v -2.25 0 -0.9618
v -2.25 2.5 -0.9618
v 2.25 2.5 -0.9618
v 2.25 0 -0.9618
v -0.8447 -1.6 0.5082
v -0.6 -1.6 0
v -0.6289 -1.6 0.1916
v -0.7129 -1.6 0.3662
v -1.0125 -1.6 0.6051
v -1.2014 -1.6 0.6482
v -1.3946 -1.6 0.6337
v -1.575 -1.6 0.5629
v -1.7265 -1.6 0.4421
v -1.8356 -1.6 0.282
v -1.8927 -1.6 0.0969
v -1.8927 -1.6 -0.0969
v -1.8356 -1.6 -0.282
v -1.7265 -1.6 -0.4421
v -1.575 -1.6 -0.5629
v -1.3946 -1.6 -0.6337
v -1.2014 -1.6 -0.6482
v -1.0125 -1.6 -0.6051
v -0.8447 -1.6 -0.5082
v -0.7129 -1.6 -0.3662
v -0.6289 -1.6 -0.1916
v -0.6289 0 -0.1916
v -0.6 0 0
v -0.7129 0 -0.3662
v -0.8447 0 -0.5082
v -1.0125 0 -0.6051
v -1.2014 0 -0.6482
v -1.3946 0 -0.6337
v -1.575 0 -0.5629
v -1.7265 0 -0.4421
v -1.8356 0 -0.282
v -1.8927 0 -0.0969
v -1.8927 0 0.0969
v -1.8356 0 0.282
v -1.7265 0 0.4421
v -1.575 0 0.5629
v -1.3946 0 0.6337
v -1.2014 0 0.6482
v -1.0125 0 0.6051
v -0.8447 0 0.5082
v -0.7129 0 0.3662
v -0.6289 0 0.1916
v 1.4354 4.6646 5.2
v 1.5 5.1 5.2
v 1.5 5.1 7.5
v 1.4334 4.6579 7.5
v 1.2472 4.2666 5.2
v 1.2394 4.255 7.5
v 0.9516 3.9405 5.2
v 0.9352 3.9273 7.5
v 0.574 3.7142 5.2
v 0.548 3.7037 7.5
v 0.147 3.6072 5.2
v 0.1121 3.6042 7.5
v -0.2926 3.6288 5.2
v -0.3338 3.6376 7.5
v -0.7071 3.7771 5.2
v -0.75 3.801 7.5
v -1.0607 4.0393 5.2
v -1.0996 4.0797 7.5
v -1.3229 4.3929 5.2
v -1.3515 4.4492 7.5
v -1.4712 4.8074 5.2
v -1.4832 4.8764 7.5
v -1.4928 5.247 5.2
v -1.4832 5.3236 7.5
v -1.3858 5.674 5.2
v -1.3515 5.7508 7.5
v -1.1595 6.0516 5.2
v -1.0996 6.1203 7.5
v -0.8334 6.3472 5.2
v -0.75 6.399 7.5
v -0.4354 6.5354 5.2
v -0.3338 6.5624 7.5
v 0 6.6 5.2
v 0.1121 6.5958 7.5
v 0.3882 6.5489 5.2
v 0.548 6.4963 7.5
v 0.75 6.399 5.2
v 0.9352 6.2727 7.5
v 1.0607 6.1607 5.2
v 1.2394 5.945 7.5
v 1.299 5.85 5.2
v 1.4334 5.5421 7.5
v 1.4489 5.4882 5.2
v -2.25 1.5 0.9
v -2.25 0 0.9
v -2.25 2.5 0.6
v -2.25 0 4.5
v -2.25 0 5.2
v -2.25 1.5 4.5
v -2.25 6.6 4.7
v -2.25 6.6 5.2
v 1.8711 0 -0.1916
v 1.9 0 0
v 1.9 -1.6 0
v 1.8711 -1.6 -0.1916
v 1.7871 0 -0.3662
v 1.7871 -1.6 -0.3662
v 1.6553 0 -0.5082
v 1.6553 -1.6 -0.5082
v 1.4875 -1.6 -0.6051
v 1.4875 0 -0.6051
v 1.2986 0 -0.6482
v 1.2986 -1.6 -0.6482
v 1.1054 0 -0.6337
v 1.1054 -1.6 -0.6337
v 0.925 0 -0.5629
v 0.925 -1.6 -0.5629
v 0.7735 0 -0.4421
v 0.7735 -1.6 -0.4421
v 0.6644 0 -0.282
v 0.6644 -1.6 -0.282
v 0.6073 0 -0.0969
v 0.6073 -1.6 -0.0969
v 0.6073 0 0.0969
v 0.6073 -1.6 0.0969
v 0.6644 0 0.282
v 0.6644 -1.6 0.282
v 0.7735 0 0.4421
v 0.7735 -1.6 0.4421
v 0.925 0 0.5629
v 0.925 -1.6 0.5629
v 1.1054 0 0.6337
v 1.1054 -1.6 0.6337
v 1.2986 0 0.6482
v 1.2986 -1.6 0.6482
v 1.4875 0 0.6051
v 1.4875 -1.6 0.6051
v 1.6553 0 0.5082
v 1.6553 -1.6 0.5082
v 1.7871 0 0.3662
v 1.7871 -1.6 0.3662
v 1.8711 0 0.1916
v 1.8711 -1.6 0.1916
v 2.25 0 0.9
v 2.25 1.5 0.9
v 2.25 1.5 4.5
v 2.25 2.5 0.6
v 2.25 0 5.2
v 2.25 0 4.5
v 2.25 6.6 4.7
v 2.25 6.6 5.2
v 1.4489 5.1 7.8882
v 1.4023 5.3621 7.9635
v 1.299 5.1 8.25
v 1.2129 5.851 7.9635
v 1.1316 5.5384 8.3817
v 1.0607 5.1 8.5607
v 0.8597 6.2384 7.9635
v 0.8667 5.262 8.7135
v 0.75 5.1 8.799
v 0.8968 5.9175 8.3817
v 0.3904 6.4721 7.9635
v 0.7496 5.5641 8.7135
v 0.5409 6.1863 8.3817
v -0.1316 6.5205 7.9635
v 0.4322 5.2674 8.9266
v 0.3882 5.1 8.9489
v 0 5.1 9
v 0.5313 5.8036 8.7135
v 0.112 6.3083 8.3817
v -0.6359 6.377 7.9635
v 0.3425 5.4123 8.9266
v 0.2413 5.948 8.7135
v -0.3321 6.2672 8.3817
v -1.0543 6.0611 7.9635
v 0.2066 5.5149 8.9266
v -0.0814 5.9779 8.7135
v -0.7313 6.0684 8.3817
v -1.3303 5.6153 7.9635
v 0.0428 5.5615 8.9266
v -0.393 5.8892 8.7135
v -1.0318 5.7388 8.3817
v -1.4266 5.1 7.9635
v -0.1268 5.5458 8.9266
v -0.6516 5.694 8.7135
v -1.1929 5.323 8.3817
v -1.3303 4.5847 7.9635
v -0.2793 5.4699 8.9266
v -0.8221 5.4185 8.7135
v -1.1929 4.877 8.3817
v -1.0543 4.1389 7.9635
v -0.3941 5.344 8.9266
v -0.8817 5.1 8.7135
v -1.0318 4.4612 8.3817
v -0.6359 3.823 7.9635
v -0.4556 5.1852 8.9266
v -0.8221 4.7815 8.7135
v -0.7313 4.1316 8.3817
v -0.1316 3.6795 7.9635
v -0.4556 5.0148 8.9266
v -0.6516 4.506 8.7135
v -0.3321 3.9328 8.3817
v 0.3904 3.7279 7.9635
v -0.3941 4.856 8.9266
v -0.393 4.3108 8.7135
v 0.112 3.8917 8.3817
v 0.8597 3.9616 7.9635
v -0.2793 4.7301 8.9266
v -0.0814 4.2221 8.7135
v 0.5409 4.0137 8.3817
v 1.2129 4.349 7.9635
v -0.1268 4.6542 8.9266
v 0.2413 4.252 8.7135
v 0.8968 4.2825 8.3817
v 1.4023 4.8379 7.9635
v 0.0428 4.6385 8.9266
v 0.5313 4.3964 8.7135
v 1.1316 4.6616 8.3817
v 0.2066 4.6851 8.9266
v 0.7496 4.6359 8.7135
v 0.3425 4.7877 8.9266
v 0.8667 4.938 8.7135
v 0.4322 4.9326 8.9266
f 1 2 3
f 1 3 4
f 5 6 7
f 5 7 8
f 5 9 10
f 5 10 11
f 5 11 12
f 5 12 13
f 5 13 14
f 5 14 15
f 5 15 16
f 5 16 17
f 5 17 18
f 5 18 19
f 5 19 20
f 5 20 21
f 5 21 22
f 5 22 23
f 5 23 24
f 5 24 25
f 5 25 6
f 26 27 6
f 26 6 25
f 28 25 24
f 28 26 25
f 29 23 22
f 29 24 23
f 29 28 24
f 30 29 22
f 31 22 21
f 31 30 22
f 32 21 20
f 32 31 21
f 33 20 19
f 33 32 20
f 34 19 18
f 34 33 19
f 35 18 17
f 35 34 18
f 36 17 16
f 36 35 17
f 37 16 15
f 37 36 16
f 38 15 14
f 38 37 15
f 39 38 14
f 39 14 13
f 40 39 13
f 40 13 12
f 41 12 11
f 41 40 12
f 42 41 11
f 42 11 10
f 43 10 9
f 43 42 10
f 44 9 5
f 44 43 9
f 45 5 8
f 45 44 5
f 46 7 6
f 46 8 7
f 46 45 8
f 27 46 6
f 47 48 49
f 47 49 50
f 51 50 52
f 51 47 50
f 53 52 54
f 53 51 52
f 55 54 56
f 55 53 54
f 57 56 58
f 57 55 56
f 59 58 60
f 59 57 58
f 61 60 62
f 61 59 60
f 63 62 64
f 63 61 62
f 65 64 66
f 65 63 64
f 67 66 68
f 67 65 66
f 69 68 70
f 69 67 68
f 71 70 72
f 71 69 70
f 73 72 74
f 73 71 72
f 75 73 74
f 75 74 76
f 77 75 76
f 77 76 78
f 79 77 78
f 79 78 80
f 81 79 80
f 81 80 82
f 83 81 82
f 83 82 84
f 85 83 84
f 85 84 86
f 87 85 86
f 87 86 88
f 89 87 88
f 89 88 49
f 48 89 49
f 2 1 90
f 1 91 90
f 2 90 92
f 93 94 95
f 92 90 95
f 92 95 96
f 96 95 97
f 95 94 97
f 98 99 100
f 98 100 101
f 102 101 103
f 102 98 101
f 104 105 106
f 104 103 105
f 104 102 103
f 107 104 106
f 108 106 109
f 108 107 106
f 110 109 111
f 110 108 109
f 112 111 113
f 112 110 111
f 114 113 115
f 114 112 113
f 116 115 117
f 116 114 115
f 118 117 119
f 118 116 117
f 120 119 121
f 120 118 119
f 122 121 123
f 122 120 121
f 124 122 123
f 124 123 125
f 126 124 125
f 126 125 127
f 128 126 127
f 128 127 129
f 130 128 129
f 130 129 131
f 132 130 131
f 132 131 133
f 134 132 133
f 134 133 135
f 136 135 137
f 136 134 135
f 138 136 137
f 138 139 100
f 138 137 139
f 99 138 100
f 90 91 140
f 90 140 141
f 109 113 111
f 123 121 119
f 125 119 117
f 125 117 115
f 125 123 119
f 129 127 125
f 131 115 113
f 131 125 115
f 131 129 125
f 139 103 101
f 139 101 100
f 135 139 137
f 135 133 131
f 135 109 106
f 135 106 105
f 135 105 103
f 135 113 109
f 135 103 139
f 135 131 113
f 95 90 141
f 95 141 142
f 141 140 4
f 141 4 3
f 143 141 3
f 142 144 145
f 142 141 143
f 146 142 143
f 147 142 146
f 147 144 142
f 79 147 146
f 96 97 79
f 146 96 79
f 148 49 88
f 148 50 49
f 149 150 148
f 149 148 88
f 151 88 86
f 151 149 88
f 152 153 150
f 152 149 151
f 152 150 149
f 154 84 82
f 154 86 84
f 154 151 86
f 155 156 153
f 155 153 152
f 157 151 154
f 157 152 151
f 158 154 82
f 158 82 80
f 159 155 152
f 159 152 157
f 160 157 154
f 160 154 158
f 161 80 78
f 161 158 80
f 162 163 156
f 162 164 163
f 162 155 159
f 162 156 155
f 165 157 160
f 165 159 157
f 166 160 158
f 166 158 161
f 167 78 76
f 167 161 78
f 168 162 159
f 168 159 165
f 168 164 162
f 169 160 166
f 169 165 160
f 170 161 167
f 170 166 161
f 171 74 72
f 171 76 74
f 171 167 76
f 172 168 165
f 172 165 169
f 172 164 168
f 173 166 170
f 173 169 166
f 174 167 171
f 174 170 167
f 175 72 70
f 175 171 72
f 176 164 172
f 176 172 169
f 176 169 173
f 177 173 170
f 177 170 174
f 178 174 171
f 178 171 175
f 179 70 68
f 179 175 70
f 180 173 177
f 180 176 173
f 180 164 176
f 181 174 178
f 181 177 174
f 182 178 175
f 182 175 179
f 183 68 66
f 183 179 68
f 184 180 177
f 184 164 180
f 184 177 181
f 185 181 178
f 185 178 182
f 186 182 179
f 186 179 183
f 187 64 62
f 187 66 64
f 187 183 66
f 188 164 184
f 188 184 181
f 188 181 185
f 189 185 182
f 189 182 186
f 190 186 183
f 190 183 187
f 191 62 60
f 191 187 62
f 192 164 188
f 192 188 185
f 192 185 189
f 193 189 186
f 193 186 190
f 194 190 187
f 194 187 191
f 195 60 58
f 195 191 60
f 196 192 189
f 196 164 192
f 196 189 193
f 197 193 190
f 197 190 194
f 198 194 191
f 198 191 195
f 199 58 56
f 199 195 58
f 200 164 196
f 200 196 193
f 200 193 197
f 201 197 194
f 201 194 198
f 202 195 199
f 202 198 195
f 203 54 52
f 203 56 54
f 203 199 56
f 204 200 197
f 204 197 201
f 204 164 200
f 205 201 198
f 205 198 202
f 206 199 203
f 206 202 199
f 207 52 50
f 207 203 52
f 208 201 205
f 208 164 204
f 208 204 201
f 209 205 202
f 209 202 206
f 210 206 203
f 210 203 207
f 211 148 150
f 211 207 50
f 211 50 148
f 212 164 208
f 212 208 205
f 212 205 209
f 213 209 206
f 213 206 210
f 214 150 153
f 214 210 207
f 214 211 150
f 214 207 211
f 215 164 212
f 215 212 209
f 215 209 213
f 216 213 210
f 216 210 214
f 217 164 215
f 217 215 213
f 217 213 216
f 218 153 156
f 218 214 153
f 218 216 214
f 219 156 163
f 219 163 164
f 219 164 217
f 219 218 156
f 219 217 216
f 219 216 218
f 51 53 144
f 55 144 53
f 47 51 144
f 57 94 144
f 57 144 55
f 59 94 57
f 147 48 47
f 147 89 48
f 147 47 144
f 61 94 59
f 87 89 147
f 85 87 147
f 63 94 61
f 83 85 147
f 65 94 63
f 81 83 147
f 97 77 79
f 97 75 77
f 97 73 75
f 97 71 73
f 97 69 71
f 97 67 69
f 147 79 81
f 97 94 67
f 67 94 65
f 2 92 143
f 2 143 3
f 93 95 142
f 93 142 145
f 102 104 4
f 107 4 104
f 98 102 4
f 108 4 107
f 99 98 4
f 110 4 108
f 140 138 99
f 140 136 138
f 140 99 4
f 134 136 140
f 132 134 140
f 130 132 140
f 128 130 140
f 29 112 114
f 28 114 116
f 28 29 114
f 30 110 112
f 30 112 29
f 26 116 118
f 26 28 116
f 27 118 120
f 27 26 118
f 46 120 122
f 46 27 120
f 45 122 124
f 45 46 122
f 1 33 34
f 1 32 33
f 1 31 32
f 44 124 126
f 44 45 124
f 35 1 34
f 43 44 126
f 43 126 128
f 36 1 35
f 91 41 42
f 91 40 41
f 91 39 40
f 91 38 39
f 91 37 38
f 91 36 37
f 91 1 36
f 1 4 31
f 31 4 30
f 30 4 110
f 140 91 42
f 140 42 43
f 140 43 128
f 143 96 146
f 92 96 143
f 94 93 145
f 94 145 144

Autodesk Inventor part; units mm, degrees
ref_plane "YZ Plane" through (0, 0, 0) normal (1, 0, 0) x (0, 1, 0)
ref_plane "XZ Plane" through (0, 0, 0) normal (0, 1, 0) x (-1, 0, 0)
ref_plane "XY Plane" through (0, 0, 0) normal (0, 0, 1) x (1, 0, 0)
sketch "Sketch1" plane through (0, 0, 0) normal (1, 0, 0) x (0, 1, 0)
  line L0 (0, 5.2) -> (6.6, 5.2)
  line L1 (6.6, 5.2) -> (6.6, 4.7)
  line L2 (2.5, 0.6) -> (2.5, -0.9618)
  line L3 (2.5, -0.9618) -> (0, -0.9618)
  line L4 (0, -0.9618) -> (0, 0.9)
  line L5 (0, 0.9) -> (1.5, 0.9)
  line L6 (1.5, 0.9) -> (1.5, 4.5)
  line L7 (1.5, 4.5) -> (0, 4.5)
  line L8 (0, 4.5) -> (0, 5.2)
  line L9 (6.6, 4.7) -> (2.5, 0.6)
  point P0 (0, 0)
  point P1 (1.5, 2.7)
  point P2 (0, 0)
  dimension "d0" = 3.6
  dimension "d1" = 1.5
  dimension "d2" = 6.6
  dimension "d3" = 45
  dimension "d4" = 5.2
  dimension "d6" = 2.7
  dimension "d7" = 0
  dimension "d8" = 1
  dimension "d9" = 0.5
extrude "Extrusion1" add sketch "Sketch1" along normal mid plane 4.5
sketch "Sketch2" plane through (-2.25, 0, 5.2) normal (0, 0, 1) x (1, 0, 0)
  line L0 (2.25, 0) -> (2.25, 10.2) construction
  circle A0 centre (2.25, 5.1) radius 1.5
  line L1 (4.5, 6.6) -> (0, 6.6) projected
  dimension "d12" = 3
extrude "Extrusion2" add sketch "Sketch2" along normal blind 3.8
fillet "Fillet1" radius 1.5 1 edges at (-1.5, 5.1, 9)
sketch "Sketch3" plane through (-2.25, 0, -0.9618) normal (0, -1, 0) x (1, 0, 0)
  circle A0 centre (1, 0.9618) radius 0.65
  circle A1 centre (3.5, 0.9618) radius 0.65
  line L0 (0, 6.1618) -> (4.5, 6.1618) projected
  point P0 (2.25, 0.9618)
  dimension "d16" = 1.3
  dimension "d17" = 1.3
  dimension "d18" = 5.2
  dimension "d19" = 1.25
  dimension "d20" = 1.25
  dimension "d21" = 5.2
extrude "Extrusion3" add sketch "Sketch3" along normal blind 1.6
properties part number "SLP3"
